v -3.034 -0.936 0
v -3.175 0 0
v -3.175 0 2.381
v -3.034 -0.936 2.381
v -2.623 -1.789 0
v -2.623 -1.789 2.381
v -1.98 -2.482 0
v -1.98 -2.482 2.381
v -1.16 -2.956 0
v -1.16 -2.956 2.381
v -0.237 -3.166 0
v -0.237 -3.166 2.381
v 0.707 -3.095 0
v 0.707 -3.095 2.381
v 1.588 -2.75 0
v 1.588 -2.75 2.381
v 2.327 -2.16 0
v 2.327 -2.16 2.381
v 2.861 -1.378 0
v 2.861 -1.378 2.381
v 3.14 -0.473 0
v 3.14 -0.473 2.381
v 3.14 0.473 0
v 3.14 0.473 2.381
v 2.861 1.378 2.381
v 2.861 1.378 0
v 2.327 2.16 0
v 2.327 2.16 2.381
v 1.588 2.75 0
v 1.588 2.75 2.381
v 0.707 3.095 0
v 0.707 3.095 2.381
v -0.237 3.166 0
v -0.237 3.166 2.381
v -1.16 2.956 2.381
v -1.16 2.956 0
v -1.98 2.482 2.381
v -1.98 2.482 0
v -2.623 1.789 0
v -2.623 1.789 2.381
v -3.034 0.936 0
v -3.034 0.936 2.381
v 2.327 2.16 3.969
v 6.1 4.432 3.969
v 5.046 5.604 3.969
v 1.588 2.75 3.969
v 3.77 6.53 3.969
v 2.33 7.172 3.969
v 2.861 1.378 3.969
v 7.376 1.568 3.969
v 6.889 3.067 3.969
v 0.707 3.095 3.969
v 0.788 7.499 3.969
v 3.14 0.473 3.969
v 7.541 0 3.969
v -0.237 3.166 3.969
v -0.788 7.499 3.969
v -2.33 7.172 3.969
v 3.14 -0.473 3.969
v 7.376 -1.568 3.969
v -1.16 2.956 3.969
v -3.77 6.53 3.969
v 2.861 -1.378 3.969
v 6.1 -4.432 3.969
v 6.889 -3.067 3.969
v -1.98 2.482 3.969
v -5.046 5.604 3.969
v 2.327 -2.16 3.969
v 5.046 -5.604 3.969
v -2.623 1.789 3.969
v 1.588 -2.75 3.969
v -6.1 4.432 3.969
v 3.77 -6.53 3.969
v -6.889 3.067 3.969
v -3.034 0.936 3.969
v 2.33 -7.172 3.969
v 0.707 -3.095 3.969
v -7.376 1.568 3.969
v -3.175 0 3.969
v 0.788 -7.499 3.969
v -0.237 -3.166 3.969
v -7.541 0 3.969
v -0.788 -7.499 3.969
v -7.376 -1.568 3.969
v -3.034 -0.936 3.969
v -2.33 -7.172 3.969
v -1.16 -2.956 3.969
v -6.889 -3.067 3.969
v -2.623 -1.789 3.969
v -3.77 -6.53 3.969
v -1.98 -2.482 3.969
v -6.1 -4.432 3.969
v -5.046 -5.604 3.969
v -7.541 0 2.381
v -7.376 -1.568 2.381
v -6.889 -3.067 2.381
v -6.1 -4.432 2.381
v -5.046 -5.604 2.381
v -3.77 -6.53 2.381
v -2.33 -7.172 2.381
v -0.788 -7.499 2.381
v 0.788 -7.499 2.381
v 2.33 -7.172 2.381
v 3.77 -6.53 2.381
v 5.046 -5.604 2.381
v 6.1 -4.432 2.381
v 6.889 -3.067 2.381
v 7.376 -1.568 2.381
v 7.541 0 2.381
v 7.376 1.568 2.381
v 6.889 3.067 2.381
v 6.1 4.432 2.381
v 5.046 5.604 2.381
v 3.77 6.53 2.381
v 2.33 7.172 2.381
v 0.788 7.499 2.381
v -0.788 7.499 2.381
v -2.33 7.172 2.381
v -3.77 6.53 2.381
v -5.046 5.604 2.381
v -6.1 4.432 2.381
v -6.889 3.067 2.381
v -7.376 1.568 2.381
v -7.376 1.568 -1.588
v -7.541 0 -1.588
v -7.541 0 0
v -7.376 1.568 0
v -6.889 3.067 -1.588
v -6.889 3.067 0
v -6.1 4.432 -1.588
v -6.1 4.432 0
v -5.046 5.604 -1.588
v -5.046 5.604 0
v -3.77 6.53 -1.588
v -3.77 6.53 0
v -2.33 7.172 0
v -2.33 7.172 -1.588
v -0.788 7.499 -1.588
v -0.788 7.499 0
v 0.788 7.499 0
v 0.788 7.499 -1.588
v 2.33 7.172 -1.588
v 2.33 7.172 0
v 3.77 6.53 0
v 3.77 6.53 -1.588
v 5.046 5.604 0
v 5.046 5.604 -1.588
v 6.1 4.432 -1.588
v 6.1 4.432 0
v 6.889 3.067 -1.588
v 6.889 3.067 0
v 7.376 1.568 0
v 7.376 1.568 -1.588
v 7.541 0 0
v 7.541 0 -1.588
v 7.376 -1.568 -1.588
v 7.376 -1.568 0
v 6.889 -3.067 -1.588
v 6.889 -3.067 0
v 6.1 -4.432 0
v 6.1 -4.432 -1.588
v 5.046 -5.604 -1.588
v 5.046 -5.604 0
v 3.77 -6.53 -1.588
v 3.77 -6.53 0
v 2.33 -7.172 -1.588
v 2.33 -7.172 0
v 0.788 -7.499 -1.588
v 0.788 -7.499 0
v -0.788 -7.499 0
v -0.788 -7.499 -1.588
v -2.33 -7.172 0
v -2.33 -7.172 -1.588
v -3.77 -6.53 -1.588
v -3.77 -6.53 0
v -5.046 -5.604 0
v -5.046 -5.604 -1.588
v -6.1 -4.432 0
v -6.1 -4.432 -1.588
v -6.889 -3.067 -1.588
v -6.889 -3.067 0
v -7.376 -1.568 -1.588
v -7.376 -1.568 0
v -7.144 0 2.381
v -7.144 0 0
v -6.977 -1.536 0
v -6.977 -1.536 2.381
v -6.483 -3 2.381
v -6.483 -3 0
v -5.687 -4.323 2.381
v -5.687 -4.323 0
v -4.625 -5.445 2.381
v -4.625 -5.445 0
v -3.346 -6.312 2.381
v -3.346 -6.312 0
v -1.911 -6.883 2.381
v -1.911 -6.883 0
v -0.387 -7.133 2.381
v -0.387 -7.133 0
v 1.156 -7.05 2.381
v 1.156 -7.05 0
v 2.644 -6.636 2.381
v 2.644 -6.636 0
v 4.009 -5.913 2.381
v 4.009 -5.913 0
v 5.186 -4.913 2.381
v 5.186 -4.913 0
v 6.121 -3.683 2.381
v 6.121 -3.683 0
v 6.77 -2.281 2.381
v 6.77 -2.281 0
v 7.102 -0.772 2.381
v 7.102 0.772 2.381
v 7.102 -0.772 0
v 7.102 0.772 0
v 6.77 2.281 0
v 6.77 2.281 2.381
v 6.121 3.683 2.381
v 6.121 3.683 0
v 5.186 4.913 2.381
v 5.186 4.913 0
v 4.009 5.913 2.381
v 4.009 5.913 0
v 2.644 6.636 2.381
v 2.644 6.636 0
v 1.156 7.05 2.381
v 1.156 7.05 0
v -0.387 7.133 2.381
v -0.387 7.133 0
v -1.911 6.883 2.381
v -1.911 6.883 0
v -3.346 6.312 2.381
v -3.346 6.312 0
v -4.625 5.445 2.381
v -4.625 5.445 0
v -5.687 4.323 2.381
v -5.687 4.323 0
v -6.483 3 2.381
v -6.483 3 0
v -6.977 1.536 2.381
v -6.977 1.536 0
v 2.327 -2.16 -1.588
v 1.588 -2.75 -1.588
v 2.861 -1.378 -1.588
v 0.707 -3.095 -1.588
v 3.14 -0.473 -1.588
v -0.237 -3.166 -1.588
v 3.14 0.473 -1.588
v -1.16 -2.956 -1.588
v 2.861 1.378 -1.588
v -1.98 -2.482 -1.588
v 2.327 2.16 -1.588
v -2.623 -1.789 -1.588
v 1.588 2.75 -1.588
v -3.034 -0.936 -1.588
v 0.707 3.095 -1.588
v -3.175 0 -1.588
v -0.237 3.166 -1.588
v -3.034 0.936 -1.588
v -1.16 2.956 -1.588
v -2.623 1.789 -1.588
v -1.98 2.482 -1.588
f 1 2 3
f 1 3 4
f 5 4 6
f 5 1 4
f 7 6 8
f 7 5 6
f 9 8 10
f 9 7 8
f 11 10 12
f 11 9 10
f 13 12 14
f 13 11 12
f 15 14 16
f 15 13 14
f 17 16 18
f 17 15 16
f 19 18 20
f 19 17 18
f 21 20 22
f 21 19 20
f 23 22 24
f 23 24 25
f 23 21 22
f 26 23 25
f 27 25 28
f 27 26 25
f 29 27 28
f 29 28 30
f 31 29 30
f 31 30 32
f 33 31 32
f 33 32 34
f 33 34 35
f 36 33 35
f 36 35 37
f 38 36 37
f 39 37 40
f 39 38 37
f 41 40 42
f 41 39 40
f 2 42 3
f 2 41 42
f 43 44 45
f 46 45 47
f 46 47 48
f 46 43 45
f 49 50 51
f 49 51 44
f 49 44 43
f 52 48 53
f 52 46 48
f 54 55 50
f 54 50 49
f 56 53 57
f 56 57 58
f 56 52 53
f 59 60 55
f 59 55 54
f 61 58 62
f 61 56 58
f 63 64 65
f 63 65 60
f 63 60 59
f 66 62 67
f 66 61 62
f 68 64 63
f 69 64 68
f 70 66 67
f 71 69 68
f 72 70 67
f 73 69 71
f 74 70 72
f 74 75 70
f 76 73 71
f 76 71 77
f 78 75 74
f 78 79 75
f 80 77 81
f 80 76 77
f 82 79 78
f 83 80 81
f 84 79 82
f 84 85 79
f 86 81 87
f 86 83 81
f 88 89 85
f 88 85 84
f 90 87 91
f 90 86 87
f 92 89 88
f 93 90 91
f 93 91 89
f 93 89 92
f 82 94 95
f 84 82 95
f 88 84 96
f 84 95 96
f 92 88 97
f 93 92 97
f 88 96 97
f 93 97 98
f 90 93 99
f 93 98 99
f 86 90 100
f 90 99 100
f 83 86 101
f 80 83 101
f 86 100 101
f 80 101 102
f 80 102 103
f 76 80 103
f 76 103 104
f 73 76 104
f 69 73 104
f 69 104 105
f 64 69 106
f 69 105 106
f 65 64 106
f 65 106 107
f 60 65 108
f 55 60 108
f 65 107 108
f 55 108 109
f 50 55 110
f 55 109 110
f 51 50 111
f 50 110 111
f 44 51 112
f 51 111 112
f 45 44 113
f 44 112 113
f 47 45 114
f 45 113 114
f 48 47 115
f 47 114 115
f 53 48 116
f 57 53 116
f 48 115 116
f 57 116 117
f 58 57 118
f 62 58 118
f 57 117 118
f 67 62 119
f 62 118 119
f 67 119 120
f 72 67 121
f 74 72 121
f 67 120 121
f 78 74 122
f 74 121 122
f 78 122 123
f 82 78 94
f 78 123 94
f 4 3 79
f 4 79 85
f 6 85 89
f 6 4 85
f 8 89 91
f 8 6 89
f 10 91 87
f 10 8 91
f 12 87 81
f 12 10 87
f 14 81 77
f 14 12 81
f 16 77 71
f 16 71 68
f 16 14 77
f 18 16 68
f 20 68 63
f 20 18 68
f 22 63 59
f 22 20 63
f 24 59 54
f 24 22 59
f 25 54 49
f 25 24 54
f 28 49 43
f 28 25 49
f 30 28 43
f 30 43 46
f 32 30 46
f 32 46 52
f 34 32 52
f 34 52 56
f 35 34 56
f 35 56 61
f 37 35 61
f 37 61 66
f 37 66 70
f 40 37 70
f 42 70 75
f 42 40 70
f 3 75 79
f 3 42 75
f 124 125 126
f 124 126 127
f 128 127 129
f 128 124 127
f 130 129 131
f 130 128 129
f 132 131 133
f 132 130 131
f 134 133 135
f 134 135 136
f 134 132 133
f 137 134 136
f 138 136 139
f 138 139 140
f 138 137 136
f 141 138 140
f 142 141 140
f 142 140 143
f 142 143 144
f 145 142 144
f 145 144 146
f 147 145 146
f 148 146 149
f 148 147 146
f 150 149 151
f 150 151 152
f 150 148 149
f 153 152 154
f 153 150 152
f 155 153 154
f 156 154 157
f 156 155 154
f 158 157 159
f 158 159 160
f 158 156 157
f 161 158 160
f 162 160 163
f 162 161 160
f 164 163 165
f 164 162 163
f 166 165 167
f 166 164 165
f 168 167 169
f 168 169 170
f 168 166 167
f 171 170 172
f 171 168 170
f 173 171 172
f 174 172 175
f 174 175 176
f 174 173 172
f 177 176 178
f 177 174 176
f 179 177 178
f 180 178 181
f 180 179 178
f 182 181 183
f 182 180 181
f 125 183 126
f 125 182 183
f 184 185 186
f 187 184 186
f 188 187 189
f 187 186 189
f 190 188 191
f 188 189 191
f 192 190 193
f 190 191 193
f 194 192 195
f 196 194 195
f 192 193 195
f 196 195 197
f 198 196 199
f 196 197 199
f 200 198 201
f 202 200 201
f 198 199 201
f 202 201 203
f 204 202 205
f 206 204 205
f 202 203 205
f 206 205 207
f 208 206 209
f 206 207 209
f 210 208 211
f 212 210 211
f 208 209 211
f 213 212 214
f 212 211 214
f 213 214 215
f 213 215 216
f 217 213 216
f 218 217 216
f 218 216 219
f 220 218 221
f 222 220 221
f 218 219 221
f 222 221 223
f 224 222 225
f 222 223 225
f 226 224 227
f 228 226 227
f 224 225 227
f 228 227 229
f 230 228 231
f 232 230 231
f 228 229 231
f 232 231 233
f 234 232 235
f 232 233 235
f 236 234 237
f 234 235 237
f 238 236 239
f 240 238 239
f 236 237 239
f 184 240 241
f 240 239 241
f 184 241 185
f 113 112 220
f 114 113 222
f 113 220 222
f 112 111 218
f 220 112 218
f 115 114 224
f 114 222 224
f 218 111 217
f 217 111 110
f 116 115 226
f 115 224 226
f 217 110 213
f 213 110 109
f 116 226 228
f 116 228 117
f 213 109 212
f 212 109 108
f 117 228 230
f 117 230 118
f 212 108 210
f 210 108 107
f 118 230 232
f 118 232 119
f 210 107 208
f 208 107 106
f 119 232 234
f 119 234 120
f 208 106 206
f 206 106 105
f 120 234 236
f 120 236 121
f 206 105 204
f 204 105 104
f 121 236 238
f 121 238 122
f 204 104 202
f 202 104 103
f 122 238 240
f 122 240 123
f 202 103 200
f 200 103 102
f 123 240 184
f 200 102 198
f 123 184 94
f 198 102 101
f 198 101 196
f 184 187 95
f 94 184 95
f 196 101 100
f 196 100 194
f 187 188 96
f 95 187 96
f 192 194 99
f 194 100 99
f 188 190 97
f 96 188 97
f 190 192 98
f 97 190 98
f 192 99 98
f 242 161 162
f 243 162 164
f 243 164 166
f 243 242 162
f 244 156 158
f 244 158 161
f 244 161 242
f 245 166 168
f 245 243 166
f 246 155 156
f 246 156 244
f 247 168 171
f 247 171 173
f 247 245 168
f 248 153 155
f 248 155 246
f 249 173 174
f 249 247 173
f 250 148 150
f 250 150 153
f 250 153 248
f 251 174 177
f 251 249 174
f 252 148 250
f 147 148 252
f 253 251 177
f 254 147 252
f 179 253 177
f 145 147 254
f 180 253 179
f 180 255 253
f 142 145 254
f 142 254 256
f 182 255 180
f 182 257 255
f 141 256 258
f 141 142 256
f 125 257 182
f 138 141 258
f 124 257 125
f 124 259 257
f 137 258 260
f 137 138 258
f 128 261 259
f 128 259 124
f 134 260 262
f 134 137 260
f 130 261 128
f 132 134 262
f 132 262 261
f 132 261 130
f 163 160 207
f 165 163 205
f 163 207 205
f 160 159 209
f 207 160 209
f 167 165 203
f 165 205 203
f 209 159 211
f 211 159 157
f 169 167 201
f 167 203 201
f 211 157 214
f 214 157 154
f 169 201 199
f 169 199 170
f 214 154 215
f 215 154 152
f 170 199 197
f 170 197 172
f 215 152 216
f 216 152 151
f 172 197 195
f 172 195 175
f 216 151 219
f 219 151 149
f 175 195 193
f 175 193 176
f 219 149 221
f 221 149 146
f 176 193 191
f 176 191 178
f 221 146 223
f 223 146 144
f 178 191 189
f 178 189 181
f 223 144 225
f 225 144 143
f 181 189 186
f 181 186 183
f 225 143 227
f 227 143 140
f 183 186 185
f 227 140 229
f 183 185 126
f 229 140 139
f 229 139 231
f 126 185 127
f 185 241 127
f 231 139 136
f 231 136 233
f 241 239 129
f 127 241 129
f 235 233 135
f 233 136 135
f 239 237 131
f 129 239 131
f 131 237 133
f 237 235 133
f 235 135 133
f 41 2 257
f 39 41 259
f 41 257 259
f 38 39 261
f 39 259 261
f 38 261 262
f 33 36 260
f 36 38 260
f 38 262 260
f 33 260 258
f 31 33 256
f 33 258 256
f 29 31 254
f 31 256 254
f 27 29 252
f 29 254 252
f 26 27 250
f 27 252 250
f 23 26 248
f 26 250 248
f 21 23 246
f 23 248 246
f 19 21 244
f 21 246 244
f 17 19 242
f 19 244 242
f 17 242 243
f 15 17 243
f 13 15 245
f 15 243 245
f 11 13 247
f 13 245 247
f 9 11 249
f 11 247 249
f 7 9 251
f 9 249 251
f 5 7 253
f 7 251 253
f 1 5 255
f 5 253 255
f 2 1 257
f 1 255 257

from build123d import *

# Parameters (mm, degrees)
SKETCH1_R           = 7.14375
SKETCH1_R_2         = 3.175
BOSS_EXTRUDE1_DEPTH = 2.38125
BOSS_EXTRUDE2_START = 1.5875
SKETCH2_R           = 7.540625
SKETCH2_R_2         = 3.175
BOSS_EXTRUDE2_DEPTH = 1.5875
SKETCH3_R           = 7.540625
SKETCH3_R_2         = 3.175
BOSS_EXTRUDE3_DEPTH = 1.5875


with BuildPart() as part:
    # Sketch1 → Boss-Extrude1 (new body)
    with BuildSketch(Plane.XY):
        with Locations(Location((0, 0, 0), (0, 0, 180))):
            Circle(SKETCH1_R)
        with Locations(Location((0, 0, 0), (0, 0, 180))):
            Circle(SKETCH1_R_2, mode=Mode.SUBTRACT)
    extrude(amount=BOSS_EXTRUDE1_DEPTH)

    # Sketch2 → Boss-Extrude2 (add)
    with BuildSketch(Plane(origin=(0, 0, 0), x_dir=(-1, 0, 0), z_dir=(0, 0, -1)).offset(BOSS_EXTRUDE2_START)):
        Circle(SKETCH2_R)
        Circle(SKETCH2_R_2, mode=Mode.SUBTRACT)
    extrude(amount=-BOSS_EXTRUDE2_DEPTH)

    # Sketch3 → Boss-Extrude3 (add)
    with BuildSketch(Plane.XY.offset(2.38125)):
        with Locations(Location((0, 0, 0), (0, 0, 180))):
            Circle(SKETCH3_R)
        with Locations(Location((0, 0, 0), (0, 0, 180))):
            Circle(SKETCH3_R_2, mode=Mode.SUBTRACT)
    extrude(amount=BOSS_EXTRUDE3_DEPTH)


solid = part.part
